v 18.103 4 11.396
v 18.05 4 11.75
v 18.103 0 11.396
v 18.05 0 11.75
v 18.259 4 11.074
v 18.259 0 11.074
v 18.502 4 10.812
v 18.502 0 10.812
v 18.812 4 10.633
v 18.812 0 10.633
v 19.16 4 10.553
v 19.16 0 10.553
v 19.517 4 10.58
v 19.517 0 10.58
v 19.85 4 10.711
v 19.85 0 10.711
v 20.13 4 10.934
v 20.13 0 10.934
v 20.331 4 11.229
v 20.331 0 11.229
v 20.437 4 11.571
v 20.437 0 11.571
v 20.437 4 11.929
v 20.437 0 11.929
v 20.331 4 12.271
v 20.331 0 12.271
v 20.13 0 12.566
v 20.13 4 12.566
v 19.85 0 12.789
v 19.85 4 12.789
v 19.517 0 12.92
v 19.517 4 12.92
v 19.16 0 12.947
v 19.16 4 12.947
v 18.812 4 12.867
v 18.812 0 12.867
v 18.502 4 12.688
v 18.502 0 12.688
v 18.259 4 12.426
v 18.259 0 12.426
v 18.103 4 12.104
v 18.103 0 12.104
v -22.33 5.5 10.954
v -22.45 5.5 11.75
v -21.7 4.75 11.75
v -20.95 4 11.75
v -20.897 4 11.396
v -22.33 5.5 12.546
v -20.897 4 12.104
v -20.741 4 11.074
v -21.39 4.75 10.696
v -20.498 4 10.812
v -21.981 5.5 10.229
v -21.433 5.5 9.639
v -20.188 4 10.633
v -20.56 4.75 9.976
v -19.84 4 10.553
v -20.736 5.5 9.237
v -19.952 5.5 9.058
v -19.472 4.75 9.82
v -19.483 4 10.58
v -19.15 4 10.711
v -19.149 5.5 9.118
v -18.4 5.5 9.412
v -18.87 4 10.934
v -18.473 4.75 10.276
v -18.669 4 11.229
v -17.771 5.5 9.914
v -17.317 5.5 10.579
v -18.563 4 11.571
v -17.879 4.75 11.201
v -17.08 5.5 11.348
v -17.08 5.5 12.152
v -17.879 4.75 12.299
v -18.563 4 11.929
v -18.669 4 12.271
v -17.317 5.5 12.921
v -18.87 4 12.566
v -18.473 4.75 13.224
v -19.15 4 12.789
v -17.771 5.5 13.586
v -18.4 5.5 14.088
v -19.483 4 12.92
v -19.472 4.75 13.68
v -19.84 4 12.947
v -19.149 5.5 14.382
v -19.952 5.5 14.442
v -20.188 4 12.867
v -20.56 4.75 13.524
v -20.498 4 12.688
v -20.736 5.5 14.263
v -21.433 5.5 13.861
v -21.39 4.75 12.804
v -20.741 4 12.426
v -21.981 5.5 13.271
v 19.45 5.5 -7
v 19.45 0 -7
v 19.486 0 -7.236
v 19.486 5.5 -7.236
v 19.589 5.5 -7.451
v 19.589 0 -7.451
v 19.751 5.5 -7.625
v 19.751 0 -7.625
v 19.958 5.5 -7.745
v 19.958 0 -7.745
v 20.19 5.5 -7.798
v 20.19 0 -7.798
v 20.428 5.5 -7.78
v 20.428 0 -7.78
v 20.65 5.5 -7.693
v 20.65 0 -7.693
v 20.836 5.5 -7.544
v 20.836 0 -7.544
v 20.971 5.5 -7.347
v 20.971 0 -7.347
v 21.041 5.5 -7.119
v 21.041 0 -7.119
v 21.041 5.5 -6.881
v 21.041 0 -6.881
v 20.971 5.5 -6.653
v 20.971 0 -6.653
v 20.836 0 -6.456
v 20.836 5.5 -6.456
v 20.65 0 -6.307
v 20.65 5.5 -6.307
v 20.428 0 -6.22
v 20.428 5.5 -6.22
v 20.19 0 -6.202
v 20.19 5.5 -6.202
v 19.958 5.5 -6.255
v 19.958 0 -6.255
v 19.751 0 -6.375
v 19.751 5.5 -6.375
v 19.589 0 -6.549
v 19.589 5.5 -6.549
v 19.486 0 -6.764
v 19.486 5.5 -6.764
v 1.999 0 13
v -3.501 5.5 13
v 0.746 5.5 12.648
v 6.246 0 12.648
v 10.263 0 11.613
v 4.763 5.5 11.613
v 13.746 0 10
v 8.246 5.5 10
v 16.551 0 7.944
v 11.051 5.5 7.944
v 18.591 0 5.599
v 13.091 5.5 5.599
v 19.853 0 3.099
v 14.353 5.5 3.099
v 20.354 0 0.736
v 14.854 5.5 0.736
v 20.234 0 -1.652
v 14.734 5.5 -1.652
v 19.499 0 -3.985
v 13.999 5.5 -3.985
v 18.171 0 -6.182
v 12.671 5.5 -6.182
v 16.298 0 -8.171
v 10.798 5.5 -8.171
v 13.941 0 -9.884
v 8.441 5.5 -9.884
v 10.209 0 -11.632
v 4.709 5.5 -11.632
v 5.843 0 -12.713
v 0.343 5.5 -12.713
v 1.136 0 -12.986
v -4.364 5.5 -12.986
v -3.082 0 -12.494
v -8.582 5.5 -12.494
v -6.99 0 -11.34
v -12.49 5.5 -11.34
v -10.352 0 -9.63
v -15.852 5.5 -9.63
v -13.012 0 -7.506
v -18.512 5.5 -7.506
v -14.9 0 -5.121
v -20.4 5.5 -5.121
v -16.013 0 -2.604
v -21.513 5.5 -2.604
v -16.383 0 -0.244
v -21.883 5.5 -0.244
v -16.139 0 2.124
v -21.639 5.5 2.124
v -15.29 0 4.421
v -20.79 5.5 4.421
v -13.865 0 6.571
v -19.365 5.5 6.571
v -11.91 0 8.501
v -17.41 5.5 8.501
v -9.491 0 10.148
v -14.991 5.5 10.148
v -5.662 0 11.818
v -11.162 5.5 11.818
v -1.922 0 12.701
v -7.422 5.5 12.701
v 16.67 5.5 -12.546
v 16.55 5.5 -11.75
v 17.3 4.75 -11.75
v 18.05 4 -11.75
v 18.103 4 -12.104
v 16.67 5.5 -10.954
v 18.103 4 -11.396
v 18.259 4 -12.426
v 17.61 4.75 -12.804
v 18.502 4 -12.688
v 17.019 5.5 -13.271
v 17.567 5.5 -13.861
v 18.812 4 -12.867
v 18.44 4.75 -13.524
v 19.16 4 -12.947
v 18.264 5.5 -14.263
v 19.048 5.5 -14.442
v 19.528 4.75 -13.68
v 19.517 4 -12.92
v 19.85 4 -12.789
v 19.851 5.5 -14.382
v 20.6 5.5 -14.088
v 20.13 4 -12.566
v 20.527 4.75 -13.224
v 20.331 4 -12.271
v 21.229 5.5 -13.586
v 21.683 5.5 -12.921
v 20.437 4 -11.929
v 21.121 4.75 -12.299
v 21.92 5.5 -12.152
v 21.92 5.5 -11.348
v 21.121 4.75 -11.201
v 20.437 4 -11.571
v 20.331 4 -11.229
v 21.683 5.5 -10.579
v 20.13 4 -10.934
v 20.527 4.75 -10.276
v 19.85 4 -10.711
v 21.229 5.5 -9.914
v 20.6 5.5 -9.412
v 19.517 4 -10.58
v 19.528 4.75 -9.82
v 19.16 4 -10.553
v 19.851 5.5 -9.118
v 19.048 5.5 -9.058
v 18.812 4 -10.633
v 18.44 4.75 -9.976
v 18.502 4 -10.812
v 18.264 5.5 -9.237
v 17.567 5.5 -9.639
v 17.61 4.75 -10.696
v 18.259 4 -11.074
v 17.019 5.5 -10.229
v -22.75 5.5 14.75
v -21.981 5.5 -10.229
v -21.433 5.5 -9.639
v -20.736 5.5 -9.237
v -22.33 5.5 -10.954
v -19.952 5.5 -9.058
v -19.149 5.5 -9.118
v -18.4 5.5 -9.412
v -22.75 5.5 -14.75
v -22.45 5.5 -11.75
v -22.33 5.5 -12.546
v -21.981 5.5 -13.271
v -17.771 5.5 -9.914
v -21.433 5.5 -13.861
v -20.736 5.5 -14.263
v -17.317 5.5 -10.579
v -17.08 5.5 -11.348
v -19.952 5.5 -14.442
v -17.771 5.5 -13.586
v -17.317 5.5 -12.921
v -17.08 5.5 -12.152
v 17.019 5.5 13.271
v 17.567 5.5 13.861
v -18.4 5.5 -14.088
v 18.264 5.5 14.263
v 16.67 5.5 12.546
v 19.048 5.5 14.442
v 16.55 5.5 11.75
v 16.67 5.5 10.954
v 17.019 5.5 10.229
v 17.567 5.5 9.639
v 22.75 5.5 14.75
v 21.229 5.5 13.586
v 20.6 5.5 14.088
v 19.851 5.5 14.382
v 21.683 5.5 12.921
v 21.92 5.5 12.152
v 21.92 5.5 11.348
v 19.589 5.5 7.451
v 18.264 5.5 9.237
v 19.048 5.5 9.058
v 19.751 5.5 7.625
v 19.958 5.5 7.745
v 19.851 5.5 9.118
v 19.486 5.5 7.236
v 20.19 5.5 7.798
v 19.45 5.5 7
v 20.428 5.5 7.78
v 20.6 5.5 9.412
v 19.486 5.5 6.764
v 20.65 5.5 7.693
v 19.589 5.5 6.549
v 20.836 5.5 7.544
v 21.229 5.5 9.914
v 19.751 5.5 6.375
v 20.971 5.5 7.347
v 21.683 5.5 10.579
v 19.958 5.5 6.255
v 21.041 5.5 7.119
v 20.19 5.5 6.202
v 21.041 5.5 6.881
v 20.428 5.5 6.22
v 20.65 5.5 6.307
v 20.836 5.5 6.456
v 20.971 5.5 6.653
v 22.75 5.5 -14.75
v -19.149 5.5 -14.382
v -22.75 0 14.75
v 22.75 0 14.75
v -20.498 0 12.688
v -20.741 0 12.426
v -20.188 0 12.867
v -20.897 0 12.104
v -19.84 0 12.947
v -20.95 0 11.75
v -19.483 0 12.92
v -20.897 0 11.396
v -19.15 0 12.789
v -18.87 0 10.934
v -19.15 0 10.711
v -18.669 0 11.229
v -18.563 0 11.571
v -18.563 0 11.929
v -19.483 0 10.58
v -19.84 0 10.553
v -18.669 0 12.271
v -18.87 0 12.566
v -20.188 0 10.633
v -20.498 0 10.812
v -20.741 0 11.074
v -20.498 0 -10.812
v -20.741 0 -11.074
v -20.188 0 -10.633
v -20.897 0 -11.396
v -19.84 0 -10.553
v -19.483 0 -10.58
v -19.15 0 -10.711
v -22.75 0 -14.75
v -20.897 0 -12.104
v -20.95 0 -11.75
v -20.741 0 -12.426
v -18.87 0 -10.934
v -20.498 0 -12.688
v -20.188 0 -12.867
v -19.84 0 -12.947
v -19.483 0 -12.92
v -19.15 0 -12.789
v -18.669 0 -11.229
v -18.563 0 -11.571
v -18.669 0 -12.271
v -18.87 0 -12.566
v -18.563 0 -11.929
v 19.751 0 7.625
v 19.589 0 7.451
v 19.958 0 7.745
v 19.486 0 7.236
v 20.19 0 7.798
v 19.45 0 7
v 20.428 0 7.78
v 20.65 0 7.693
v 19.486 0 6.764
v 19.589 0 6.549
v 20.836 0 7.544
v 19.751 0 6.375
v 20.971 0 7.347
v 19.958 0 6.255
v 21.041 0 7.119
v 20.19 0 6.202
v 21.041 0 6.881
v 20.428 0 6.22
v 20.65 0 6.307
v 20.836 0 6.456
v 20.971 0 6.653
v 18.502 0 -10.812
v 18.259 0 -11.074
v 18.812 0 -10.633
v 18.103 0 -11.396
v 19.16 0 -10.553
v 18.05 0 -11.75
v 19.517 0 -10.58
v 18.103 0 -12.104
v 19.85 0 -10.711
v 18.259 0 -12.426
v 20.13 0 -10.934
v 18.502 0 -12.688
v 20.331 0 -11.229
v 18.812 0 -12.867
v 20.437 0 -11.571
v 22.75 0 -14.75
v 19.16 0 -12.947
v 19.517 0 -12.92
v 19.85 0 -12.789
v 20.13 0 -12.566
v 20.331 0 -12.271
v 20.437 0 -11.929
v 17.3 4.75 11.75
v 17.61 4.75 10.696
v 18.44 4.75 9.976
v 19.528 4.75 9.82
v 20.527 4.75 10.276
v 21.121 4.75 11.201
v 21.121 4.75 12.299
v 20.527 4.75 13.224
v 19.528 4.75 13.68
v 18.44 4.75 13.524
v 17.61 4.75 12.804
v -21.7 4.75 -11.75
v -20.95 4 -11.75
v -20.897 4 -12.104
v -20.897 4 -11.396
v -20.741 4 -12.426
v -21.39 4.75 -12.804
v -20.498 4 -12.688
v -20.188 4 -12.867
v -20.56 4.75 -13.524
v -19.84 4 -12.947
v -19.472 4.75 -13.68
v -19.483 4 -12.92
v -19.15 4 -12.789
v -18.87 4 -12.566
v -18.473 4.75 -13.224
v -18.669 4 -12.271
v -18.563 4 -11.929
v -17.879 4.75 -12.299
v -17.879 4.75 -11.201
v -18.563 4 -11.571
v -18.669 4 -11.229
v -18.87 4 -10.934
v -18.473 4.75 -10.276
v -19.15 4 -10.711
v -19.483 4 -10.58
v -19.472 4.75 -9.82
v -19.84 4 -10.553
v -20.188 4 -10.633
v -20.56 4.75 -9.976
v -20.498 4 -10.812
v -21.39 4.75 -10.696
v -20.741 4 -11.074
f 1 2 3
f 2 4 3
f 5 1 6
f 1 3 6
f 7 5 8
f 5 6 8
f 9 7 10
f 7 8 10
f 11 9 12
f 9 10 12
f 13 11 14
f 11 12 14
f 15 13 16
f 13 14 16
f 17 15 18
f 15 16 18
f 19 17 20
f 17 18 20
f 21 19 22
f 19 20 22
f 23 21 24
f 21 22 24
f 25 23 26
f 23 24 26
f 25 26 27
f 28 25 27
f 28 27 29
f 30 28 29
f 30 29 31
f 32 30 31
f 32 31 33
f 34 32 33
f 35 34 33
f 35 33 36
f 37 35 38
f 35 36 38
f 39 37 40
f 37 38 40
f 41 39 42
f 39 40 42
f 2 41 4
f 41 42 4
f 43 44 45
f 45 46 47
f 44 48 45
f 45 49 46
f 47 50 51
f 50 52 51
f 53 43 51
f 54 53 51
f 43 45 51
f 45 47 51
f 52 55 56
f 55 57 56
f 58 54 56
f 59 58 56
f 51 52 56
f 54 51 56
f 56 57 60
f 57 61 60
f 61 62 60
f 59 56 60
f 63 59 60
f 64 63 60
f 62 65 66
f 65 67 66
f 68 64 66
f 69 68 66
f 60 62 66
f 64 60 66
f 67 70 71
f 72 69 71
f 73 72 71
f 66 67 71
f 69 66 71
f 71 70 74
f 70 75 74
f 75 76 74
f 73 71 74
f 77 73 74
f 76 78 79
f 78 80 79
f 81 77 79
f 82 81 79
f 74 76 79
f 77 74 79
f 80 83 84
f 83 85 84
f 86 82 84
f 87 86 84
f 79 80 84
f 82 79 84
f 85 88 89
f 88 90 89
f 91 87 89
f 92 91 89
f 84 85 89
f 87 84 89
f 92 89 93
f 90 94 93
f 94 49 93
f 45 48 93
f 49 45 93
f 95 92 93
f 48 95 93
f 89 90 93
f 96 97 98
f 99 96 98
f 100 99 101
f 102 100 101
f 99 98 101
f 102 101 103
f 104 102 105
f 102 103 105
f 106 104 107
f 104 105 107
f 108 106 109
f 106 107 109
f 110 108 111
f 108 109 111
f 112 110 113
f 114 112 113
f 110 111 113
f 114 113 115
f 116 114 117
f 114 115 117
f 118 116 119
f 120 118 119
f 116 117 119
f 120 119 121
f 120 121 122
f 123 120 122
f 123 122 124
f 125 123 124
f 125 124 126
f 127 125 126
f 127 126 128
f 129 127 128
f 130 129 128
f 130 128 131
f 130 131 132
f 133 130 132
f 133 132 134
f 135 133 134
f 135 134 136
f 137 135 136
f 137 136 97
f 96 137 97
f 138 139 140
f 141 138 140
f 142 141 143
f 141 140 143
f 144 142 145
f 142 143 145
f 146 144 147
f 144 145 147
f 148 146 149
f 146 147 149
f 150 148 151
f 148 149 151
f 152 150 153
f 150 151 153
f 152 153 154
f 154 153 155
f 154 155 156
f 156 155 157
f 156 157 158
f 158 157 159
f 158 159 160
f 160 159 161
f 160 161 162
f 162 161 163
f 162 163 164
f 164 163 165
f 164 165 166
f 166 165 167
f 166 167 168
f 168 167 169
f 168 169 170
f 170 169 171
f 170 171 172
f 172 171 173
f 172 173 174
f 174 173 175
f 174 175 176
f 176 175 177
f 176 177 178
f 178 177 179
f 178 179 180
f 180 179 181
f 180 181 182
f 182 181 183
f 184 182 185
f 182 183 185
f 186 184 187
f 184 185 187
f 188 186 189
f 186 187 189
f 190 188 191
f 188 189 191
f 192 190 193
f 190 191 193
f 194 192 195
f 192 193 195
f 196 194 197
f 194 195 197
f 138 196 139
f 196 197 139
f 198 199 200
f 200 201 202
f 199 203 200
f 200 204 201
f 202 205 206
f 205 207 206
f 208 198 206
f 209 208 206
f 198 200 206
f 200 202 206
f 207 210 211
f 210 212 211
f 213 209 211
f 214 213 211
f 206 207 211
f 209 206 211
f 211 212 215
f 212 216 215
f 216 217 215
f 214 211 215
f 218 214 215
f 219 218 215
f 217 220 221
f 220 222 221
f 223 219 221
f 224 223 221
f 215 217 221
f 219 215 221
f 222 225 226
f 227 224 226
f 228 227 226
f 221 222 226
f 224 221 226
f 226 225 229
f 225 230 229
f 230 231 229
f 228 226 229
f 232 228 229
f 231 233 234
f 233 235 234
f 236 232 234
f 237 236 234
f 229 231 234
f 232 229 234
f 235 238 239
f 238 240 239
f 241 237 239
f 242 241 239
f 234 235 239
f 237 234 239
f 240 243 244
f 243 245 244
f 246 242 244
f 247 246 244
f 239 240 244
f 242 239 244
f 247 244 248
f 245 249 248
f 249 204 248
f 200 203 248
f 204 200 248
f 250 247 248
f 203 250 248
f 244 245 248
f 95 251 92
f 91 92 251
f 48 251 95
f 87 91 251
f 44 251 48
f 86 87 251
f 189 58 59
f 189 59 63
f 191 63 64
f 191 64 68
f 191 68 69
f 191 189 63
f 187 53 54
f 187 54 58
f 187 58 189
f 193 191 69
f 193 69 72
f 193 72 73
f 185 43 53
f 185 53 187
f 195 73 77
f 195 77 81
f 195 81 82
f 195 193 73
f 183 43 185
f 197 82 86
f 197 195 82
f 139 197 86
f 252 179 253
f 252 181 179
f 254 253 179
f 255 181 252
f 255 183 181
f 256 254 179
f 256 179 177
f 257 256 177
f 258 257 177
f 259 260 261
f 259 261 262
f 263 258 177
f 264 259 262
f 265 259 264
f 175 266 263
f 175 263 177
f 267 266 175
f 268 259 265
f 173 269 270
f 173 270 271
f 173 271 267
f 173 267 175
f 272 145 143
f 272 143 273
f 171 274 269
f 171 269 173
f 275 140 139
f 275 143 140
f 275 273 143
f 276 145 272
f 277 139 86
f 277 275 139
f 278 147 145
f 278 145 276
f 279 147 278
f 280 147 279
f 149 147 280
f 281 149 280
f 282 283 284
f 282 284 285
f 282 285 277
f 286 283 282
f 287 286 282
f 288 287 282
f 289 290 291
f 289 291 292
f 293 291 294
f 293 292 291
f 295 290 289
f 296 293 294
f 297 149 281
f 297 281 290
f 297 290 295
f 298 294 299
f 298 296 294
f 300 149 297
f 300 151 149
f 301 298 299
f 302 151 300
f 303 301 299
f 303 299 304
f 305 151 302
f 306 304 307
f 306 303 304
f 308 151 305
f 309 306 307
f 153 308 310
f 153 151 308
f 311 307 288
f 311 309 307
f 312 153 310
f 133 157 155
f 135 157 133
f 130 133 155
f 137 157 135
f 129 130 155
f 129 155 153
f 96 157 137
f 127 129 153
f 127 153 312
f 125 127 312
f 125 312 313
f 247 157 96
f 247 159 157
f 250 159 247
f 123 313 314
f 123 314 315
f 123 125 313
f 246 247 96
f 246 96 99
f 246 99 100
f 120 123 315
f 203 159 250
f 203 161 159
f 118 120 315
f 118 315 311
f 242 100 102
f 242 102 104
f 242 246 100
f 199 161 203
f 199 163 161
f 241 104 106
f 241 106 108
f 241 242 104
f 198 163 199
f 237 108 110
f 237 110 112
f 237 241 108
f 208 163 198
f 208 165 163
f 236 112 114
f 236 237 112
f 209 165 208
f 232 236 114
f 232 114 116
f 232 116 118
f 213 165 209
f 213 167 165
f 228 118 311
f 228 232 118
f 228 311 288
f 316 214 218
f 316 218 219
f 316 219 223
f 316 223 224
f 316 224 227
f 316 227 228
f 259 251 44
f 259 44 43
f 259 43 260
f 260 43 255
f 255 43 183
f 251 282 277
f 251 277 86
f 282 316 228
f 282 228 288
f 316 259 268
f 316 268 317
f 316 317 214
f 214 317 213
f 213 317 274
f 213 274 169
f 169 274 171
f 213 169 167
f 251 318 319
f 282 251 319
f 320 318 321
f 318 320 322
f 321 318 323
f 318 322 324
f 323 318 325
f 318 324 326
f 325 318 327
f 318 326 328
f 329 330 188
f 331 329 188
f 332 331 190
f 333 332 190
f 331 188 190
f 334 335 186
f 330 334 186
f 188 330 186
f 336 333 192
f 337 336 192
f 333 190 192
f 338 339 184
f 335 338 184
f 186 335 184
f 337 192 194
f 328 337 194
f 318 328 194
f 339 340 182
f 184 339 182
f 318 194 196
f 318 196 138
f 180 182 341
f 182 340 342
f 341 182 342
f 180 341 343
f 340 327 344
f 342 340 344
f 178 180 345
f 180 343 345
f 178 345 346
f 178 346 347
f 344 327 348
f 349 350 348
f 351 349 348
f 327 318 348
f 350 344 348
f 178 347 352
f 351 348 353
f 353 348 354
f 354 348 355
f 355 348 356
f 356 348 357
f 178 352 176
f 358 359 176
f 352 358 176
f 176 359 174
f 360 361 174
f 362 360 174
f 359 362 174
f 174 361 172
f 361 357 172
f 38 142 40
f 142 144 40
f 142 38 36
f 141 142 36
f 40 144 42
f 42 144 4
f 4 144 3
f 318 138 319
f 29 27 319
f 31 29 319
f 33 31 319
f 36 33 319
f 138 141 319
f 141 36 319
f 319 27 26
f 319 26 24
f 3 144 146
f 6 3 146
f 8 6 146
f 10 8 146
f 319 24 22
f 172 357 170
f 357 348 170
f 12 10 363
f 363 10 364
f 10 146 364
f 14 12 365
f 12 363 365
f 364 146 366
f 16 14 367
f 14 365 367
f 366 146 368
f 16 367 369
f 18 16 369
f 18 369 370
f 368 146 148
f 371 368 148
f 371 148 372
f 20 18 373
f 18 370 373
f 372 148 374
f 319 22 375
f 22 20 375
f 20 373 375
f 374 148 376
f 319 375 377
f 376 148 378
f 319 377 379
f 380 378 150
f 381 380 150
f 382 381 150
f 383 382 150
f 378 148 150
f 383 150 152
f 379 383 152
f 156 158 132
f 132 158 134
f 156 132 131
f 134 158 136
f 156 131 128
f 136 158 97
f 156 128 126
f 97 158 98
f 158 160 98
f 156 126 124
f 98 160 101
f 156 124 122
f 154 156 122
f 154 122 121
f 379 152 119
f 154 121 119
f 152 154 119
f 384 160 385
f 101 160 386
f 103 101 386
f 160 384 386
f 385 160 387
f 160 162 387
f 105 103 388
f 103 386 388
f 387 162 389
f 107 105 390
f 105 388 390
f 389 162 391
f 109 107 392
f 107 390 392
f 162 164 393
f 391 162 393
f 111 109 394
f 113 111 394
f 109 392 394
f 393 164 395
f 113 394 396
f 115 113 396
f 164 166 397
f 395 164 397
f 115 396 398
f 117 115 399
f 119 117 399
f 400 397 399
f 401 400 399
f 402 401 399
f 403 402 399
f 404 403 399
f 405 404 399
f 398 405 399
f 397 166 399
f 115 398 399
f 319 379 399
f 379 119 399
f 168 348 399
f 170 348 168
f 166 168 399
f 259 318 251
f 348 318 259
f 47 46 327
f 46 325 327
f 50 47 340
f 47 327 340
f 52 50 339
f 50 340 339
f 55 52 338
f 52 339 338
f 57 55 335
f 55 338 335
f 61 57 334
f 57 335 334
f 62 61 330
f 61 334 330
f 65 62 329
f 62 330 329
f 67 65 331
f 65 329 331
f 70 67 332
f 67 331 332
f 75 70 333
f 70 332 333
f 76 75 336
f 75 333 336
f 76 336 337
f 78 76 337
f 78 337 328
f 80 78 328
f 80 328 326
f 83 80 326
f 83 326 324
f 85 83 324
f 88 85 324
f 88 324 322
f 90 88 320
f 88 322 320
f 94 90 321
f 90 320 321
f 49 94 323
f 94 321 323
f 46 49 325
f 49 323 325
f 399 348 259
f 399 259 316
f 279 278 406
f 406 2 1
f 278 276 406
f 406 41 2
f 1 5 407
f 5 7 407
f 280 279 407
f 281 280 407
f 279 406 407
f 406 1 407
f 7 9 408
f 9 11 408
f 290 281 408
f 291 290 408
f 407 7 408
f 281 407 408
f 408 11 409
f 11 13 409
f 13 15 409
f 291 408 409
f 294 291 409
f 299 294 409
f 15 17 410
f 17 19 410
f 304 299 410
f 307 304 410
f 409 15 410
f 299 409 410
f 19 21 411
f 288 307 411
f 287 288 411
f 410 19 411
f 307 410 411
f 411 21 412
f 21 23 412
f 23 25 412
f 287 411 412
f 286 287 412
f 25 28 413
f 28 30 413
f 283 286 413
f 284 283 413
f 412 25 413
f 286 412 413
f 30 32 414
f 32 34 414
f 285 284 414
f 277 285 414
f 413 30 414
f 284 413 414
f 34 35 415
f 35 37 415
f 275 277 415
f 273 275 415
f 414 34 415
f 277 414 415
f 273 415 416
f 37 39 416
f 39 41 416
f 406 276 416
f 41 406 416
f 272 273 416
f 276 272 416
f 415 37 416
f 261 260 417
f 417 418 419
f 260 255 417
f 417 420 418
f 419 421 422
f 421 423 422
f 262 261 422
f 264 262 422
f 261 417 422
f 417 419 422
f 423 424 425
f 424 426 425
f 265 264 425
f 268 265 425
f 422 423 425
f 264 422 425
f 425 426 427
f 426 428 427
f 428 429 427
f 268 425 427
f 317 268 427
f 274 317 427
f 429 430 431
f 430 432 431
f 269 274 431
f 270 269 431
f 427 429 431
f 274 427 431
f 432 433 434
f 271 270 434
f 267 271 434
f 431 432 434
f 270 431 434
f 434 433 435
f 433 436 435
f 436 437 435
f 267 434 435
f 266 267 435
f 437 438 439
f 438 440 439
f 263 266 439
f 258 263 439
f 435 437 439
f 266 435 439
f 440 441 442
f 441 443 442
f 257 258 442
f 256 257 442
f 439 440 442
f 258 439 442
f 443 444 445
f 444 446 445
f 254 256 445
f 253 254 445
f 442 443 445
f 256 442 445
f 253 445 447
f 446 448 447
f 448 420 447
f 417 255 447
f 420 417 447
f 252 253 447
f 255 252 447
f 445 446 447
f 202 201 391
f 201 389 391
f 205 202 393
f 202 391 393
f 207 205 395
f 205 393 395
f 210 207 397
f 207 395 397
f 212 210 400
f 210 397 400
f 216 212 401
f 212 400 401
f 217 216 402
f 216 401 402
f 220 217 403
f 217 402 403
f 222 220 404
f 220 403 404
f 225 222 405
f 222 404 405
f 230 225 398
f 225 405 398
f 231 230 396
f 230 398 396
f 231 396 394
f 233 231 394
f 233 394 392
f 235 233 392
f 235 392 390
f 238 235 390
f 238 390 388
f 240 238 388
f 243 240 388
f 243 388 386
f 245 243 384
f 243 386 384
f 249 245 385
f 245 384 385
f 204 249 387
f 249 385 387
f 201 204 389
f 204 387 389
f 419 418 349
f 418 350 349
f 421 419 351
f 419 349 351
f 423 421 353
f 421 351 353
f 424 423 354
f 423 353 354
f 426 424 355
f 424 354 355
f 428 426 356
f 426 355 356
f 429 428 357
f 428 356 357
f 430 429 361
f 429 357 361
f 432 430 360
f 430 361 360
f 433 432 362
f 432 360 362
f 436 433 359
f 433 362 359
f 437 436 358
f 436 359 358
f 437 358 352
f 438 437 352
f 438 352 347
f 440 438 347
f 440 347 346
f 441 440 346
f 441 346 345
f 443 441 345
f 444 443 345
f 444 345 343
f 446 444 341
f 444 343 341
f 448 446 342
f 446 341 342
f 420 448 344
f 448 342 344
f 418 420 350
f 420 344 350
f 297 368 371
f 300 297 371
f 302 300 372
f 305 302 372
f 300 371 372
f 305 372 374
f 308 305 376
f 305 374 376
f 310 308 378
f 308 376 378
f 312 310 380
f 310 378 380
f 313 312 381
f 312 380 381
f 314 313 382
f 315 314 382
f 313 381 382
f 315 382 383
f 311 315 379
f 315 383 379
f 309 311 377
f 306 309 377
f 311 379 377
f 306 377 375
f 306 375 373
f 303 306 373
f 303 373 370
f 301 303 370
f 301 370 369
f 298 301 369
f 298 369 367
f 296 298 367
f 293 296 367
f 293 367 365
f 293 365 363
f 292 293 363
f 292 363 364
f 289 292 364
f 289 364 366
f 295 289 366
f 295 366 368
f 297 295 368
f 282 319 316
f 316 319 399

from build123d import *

# Parameters (mm, degrees)
SKETCH1_W                                           = 45.5
SKETCH1_H                                           = 29.5
BOSS_EXTRUDE1_DEPTH                                 = 5.5
CUT_EXTRUDE1_REACH                                  = 38.062
SKETCH2_R                                           = 13
CSK_FOR_M2_COUNTERSUNK_FLAT_HEAD_SCREW1_D           = 2.4
CSK_FOR_M2_COUNTERSUNK_FLAT_HEAD_SCREW1_CSINK_D     = 5.4
CSK_FOR_M2_COUNTERSUNK_FLAT_HEAD_SCREW1_CSINK_ANGLE = 90
M2_TAPPED_HOLE1_D                                   = 1.6


with BuildPart() as part:
    # Sketch1 → Boss-Extrude1 (new body)
    with BuildSketch(Plane(origin=(0, 0, 0), x_dir=(1, 0, 0), z_dir=(0, 1, 0))):
        Rectangle(SKETCH1_W, SKETCH1_H)
    extrude(amount=BOSS_EXTRUDE1_DEPTH)

    # Sketch2 → Cut-Extrude1 (cut, up to next)
    with BuildSketch(Plane(origin=(-14.125, 14.125, 0), x_dir=(0, 0, 1), z_dir=(-0.707106781, 0.707106781, 0)), mode=Mode.PRIVATE) as cut_extrude1_sk1:
        with Locations((0, 1.413320728)):
            Circle(SKETCH2_R)
    cut_extrude1_tool1 = extrude(cut_extrude1_sk1.sketch, amount=-CUT_EXTRUDE1_REACH, mode=Mode.PRIVATE) & part.part
    add(cut_extrude1_tool1.solids().sort_by_distance((-13.125631, 15.124369, 0))[0], mode=Mode.SUBTRACT)

    # CSK for M2 Countersunk Flat Head Screw1 (through all)
    with Locations(Plane(origin=(0, 5.5, 0), x_dir=(1, 0, 0), z_dir=(0, 1, 0))):
        with Locations((-19.75, 11.75), (19.25, 11.75), (-19.75, -11.75), (19.25, -11.75)):
            CounterSinkHole(CSK_FOR_M2_COUNTERSUNK_FLAT_HEAD_SCREW1_D / 2, CSK_FOR_M2_COUNTERSUNK_FLAT_HEAD_SCREW1_CSINK_D / 2, counter_sink_angle=CSK_FOR_M2_COUNTERSUNK_FLAT_HEAD_SCREW1_CSINK_ANGLE)

    # M2 Tapped Hole1 (through all)
    with Locations(Plane(origin=(0, 5.5, 0), x_dir=(1, 0, 0), z_dir=(0, 1, 0))):
        with Locations((20.25, 7), (20.25, -7)):
            Hole(M2_TAPPED_HOLE1_D / 2)


solid = part.part
